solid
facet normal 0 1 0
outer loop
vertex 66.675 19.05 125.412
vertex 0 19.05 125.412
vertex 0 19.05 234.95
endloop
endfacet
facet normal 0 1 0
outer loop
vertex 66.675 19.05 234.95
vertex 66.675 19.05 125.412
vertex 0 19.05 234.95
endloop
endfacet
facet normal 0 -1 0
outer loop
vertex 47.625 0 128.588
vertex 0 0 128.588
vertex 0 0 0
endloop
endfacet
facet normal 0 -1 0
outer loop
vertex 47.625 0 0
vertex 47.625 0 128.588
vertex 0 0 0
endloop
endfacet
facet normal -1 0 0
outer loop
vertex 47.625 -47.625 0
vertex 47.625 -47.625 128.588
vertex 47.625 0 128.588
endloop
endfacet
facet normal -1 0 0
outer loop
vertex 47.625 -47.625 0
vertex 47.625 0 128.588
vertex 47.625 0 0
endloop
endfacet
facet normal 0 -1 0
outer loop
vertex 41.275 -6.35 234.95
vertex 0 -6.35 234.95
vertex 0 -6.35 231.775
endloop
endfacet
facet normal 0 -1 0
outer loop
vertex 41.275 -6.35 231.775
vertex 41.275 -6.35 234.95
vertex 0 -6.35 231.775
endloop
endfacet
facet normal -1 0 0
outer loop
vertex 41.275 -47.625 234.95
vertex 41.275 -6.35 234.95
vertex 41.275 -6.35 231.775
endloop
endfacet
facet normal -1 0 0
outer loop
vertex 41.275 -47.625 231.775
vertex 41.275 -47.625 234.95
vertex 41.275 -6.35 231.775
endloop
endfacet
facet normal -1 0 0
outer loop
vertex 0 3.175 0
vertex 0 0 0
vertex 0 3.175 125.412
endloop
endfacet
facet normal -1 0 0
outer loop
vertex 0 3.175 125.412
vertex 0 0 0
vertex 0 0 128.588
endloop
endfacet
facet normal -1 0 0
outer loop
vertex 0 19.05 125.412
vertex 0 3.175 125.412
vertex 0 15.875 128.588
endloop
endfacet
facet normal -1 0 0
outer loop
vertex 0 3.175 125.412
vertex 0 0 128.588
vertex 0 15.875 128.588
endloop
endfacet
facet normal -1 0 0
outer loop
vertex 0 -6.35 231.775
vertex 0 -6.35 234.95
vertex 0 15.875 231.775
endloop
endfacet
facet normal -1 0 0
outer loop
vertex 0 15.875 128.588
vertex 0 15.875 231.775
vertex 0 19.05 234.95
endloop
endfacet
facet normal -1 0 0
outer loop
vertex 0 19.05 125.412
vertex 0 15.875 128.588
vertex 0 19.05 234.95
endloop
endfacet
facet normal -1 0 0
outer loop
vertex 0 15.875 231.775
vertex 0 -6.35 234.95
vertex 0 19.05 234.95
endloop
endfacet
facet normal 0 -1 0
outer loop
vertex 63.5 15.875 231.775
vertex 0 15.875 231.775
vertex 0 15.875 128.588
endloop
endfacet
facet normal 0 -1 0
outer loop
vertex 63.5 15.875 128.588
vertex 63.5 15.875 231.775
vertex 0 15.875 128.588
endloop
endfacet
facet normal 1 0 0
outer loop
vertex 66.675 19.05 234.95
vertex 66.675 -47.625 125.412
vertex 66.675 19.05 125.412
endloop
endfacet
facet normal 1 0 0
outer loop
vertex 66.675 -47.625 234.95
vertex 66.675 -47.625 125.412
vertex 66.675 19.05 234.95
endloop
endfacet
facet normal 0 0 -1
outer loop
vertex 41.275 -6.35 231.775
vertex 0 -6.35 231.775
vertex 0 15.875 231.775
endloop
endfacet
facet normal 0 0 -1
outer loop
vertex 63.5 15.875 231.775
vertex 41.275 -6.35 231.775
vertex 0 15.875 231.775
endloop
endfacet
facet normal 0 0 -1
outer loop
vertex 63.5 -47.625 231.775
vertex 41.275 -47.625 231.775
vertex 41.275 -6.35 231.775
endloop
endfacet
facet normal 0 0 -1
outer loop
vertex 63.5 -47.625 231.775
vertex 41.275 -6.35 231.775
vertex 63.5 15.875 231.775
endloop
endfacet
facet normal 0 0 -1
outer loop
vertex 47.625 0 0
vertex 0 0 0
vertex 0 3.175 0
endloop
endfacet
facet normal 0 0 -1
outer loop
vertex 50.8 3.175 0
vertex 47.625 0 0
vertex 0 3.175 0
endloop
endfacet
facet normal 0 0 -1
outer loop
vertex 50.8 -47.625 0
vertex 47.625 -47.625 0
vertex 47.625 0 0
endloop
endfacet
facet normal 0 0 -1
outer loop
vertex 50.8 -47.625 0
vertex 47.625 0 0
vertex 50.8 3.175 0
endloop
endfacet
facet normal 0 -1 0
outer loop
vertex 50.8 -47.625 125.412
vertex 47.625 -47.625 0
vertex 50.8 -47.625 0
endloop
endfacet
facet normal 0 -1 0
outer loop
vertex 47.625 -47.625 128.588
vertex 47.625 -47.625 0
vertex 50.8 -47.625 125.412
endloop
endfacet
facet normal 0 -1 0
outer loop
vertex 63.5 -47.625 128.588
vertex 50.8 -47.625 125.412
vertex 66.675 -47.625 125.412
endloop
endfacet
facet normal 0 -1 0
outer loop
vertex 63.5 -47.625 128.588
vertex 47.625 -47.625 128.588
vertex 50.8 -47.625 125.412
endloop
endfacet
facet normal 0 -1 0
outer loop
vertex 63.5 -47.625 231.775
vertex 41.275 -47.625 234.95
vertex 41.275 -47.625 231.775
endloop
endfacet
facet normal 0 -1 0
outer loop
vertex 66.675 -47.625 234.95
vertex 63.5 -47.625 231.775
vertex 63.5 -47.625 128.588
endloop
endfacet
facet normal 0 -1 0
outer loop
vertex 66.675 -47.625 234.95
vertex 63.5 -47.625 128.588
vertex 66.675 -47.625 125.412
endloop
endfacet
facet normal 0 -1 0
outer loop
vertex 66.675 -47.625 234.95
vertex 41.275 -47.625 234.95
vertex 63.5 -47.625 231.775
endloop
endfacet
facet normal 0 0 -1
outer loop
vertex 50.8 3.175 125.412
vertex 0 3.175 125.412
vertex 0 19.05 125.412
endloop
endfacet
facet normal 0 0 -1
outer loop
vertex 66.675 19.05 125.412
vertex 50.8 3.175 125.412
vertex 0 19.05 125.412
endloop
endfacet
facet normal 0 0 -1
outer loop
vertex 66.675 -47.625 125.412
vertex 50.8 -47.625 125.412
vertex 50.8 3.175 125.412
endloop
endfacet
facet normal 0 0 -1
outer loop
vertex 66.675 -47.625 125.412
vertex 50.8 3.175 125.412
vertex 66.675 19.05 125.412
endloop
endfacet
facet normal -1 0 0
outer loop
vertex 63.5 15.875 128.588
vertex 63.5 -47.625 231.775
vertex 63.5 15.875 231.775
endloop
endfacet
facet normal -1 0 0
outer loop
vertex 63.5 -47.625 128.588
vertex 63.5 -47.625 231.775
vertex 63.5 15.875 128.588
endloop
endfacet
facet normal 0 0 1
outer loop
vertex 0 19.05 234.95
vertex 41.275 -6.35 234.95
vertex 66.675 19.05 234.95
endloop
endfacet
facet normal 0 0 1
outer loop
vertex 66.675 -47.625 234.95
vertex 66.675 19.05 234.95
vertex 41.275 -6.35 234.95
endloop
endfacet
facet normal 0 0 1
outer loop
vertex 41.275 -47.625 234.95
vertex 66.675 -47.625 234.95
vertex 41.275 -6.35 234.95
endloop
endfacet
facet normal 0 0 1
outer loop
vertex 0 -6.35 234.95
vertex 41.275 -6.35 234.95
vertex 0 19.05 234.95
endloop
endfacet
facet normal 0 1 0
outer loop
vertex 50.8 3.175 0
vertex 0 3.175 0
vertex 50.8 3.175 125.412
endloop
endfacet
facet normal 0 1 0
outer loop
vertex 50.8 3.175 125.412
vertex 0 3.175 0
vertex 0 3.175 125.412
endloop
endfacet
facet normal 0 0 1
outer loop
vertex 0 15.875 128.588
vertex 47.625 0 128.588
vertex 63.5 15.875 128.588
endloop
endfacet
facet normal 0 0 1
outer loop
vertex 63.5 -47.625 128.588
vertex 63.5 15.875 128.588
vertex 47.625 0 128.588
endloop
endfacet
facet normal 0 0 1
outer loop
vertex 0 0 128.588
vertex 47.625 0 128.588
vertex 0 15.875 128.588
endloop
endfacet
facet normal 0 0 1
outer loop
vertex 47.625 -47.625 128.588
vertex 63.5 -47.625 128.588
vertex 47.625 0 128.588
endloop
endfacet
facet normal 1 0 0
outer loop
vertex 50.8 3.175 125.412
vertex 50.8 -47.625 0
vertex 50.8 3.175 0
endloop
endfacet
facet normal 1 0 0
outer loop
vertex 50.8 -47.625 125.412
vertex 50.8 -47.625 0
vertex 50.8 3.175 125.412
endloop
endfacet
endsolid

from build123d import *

# Parameters (mm, degrees)
F1_DEPTH = 66.675
F3_DEPTH = 234.951


with BuildPart() as f1:
    # F0 (on Right) → F1 (new body)
    with BuildSketch(Plane.YZ):
        Polygon((0, 128.5875), (0, 0), (3.175, 0), (3.175, 125.4125), (19.05, 125.4125), (19.05, 234.95), (-6.35, 234.95), (-6.35, 231.775), (15.875, 231.775), (15.875, 128.5875), align=None)
    extrude(amount=F1_DEPTH)

    # F2 (on face) → F3 (cut, through all)
    with BuildSketch(Plane.XY.offset(234.95)):
        Polygon((66.675, -6.35), (66.675, 19.05), (41.275, -6.35), align=None)
    extrude(amount=-F3_DEPTH, mode=Mode.SUBTRACT)

    # F4: F1 across face


with BuildPart() as f1_1:
    add(f1.part)
    add(f1.part.mirror(Plane(origin=(56.208576, 8.583576, 127.461483), x_dir=(0.707107, 0.707107, 0), z_dir=(0.707107, -0.707107, 0))))


solid = f1_1.part
